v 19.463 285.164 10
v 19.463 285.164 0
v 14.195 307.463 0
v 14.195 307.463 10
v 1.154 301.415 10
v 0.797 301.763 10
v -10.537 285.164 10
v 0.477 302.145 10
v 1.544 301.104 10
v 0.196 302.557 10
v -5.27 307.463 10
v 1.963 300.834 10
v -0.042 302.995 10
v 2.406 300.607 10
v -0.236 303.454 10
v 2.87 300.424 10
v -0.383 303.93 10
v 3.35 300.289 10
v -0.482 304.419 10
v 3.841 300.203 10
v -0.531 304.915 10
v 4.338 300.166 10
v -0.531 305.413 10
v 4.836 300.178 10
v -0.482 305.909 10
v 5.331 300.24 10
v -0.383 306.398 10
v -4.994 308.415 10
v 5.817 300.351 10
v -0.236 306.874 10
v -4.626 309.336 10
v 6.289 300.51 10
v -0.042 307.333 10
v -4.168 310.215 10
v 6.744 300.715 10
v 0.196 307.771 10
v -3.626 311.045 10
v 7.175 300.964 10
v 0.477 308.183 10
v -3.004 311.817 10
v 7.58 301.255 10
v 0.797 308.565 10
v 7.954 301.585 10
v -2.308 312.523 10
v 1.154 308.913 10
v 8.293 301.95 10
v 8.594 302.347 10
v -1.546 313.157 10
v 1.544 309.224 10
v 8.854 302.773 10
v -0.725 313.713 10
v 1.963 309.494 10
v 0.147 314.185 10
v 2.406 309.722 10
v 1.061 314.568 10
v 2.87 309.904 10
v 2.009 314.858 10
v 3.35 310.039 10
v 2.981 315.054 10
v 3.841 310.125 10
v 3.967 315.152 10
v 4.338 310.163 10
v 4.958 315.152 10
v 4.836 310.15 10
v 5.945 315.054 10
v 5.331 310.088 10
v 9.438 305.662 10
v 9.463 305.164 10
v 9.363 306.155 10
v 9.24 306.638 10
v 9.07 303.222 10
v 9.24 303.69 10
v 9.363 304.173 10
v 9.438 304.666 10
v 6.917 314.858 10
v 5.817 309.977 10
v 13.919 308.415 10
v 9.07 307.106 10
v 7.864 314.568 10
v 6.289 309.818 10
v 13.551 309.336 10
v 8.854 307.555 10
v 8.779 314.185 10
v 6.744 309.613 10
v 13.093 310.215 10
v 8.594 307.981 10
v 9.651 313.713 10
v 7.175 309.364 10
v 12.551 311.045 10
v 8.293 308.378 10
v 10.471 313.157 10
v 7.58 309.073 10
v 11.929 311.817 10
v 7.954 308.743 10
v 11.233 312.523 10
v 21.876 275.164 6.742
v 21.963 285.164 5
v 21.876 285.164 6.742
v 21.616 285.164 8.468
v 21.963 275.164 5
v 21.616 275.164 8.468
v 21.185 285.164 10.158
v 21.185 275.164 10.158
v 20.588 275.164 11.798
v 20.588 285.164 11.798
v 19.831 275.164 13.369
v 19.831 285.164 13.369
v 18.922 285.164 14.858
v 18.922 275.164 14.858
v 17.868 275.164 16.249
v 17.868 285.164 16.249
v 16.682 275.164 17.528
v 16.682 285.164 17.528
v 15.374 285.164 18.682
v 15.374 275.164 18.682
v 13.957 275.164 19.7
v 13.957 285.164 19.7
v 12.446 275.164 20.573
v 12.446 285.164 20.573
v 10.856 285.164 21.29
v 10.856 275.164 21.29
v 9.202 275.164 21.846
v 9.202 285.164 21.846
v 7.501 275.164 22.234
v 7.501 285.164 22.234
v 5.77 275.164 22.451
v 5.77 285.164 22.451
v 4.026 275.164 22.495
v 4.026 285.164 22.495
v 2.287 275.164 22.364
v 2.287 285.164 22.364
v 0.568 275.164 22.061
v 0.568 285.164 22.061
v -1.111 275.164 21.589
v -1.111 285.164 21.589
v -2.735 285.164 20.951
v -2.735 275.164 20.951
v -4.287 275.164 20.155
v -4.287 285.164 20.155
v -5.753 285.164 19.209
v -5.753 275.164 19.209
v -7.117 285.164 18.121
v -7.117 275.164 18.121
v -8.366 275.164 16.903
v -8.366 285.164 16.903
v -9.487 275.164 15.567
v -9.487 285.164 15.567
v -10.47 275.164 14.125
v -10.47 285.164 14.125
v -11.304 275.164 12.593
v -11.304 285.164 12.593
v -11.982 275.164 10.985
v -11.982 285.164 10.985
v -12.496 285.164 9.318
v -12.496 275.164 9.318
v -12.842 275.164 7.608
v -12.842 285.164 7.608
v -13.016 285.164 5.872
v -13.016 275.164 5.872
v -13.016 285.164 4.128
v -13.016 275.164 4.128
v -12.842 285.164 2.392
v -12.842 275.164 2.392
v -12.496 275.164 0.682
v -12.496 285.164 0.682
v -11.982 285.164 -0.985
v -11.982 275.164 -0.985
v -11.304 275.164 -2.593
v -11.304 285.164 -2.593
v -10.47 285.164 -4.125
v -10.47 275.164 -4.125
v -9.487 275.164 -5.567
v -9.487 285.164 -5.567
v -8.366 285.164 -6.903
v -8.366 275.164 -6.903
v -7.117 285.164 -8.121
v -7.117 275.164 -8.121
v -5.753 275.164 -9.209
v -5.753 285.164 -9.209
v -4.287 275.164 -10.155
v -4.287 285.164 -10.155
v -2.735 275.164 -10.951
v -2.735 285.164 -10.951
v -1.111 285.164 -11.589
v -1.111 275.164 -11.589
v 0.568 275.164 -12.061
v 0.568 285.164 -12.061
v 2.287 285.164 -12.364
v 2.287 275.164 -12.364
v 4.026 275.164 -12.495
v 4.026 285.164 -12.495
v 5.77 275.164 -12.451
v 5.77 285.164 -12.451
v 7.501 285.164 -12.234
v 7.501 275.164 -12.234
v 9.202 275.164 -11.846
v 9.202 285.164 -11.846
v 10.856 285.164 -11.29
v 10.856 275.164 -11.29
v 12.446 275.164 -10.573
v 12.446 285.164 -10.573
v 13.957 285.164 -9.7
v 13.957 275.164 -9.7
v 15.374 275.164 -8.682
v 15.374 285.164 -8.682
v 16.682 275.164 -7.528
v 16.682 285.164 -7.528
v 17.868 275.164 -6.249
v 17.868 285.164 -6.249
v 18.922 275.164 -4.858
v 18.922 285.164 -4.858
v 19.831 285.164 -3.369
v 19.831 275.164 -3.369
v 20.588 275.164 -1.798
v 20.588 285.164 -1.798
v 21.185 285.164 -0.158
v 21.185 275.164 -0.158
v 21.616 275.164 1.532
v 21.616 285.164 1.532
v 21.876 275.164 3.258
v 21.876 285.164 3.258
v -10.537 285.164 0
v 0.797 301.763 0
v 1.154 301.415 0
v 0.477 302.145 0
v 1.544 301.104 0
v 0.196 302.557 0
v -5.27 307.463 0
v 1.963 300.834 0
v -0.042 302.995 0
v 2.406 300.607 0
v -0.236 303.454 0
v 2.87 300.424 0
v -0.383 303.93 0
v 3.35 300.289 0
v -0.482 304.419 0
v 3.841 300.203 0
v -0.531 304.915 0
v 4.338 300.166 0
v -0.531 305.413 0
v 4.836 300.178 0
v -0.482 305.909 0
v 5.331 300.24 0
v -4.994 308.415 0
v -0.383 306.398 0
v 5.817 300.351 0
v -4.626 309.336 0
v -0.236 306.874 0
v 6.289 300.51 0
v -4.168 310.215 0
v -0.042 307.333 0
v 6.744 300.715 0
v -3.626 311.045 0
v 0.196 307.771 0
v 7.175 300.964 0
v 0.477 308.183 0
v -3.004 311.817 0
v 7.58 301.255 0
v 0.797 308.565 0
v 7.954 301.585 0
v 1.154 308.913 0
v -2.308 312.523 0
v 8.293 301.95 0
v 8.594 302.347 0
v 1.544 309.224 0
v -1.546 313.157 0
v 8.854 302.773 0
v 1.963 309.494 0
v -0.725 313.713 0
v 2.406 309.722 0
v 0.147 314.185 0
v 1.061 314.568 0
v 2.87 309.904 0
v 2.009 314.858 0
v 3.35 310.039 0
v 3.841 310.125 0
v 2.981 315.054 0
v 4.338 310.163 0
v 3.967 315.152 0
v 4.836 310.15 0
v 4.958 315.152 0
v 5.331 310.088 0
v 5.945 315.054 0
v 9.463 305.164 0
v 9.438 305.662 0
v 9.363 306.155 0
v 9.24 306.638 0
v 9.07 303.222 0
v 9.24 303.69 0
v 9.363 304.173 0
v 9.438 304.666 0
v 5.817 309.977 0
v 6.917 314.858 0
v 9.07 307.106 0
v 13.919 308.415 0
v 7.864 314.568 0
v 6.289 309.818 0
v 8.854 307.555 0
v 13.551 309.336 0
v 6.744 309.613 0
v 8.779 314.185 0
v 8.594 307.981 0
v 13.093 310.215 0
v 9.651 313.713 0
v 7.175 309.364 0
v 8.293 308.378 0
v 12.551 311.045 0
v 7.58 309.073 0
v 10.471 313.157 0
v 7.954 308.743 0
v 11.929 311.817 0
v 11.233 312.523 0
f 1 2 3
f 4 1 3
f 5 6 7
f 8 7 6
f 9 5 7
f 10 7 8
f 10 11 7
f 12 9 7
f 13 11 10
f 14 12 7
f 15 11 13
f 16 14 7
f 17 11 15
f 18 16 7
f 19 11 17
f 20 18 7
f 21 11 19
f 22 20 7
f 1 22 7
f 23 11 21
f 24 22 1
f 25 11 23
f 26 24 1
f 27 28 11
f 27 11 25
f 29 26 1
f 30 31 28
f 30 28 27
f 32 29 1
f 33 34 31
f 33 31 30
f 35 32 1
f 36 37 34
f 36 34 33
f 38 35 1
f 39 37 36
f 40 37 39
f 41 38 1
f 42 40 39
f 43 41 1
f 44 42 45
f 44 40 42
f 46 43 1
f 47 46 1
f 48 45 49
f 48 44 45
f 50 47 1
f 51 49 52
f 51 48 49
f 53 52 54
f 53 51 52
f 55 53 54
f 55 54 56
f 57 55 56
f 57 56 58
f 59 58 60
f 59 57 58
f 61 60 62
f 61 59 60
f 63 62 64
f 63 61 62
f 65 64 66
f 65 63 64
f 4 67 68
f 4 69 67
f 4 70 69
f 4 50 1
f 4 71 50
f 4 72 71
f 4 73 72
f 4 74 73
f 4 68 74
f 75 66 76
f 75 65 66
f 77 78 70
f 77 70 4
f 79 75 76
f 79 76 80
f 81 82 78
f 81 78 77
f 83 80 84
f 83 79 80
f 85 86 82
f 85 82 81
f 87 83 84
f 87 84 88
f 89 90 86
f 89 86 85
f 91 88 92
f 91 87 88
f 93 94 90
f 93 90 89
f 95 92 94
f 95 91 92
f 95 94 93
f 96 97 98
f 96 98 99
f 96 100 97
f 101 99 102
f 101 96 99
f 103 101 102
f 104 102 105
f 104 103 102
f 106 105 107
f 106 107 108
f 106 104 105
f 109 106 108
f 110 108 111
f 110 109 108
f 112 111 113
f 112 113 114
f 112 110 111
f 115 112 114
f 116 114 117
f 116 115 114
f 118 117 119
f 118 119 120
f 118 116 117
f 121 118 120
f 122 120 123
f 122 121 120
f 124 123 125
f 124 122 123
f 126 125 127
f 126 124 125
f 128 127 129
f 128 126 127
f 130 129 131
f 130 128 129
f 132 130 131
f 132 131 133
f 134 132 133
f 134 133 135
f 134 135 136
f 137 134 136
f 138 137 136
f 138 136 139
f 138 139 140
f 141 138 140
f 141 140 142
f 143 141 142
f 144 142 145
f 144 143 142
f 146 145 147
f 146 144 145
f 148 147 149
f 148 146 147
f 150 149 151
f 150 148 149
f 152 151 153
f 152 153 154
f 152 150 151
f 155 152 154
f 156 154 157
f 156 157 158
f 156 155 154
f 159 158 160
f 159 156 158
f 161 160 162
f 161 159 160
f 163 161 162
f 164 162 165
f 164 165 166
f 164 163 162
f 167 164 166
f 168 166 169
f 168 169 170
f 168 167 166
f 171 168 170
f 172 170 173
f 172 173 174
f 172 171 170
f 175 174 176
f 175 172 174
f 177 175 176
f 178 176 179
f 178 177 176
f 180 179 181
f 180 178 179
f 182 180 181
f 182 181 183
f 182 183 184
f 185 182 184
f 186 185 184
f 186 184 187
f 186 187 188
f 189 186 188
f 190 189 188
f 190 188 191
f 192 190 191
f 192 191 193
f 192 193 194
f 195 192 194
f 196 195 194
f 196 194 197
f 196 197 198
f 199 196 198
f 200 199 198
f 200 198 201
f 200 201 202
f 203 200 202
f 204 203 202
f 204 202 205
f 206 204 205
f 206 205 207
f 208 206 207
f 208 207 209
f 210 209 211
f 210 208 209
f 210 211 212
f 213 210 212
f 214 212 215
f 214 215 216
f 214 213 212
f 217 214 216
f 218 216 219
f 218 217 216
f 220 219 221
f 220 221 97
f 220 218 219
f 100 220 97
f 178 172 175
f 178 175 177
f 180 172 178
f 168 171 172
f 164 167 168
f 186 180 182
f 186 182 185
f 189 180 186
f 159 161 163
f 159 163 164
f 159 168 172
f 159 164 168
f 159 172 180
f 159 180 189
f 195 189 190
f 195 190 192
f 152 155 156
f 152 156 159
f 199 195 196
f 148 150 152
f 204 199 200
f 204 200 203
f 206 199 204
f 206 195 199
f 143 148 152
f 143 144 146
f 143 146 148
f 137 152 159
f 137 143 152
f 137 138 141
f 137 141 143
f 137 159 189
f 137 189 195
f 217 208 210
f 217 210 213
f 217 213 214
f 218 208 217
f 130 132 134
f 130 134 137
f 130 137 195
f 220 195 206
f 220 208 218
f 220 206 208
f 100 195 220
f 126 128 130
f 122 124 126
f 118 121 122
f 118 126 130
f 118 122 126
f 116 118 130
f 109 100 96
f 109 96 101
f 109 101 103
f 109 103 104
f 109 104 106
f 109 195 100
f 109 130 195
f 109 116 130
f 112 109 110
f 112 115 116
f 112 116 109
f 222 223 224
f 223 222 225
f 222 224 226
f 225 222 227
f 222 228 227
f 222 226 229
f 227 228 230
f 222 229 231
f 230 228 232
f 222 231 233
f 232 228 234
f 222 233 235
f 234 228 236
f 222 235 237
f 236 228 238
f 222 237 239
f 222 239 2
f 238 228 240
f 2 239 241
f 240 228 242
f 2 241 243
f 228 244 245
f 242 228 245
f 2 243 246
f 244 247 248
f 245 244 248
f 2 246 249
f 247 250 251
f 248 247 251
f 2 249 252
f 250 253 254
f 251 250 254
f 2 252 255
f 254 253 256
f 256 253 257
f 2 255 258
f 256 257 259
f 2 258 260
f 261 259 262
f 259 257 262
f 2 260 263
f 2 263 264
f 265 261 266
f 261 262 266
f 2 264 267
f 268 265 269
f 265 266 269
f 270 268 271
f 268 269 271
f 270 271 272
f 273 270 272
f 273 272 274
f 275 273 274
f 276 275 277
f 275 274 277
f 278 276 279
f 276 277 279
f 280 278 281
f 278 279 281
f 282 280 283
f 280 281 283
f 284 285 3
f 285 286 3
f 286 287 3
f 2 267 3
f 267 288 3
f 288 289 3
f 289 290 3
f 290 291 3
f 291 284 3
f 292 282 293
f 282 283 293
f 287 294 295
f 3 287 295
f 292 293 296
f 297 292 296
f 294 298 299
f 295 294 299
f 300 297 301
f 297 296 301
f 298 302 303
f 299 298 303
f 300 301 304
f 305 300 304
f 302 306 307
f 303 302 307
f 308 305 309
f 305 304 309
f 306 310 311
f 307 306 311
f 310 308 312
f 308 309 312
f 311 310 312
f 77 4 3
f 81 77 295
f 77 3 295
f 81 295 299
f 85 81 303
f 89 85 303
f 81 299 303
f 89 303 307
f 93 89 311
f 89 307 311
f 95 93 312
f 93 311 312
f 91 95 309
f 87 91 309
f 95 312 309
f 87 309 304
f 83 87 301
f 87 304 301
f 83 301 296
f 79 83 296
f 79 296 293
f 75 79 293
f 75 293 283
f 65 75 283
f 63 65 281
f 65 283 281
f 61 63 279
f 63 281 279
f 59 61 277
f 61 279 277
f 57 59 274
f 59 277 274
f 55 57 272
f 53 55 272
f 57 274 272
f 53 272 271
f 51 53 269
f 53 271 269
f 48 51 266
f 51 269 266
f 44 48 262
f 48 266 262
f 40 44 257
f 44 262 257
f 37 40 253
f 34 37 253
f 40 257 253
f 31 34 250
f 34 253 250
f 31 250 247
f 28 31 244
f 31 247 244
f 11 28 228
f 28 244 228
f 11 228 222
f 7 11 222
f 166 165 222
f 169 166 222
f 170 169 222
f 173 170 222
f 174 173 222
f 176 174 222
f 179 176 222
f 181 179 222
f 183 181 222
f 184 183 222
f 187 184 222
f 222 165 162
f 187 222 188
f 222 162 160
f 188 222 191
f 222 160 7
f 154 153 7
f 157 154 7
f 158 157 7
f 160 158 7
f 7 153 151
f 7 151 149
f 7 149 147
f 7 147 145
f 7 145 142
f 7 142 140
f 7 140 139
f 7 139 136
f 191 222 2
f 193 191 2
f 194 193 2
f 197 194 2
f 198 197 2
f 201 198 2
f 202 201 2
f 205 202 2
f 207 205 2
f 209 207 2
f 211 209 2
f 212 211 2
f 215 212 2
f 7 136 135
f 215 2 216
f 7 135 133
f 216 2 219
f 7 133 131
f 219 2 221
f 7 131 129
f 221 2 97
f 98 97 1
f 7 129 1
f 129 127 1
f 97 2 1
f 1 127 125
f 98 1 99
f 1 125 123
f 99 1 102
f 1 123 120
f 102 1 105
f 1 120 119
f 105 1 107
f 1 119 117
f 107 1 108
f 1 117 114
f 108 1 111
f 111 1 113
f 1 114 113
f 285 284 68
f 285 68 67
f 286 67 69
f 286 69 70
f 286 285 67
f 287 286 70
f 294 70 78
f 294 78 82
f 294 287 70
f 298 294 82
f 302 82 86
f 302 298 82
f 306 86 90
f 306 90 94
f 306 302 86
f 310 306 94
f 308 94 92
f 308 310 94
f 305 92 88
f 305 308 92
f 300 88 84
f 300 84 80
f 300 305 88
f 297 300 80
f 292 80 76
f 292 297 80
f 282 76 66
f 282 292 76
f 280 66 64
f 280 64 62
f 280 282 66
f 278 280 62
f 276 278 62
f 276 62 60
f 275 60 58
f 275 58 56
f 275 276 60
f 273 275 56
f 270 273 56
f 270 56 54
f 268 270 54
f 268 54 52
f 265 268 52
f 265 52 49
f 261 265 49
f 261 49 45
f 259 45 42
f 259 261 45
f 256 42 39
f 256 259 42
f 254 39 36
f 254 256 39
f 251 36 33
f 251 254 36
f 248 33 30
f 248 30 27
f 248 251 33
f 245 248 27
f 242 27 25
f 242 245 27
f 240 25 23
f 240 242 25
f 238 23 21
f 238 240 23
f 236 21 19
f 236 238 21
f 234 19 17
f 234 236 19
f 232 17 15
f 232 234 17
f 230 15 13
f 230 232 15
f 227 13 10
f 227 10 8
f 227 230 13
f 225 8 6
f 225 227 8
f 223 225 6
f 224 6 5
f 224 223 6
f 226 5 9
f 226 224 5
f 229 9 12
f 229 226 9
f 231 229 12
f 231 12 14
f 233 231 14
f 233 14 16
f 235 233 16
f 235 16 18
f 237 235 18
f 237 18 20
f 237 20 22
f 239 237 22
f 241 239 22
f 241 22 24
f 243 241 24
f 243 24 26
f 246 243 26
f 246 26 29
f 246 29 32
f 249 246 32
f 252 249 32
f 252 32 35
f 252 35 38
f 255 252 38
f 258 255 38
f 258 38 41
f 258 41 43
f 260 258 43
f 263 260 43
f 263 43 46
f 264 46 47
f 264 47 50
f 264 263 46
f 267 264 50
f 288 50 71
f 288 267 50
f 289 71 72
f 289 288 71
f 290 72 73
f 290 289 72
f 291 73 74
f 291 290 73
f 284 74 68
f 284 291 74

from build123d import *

# Parameters (mm, degrees)
SKETCH_1_R           = 5
EXTRUDE_1_DEPTH      = 10
EXTRUDE_2_DEPTH      = 5
EXTRUDE_2_DEPTH_BACK = 5
SKETCH_2_R           = 17.5


with BuildPart() as part:
    # 草图1 → 凸台-拉伸1 (new body)
    with BuildSketch(Plane.XY):
        with BuildLine():
            Line((-5.269515354, 307.463167958), (-10.537394242, 285.164077124))
            Line((-10.537394242, 285.164077124), (-10.537394242, 280.164077124))
            Line((-10.537394242, 280.164077124), (19.462605758, 280.164077124))
            Line((19.462605758, 280.164077124), (19.462605758, 285.164077124))
            Line((19.462605758, 285.164077124), (14.19472687, 307.463167958))
            ThreePointArc((14.19472687, 307.463167958), (4.462605758, 315.164077124), (-5.269515354, 307.463167958))
        make_face()
        with Locations((4.462605758, 305.164077124)):
            Circle(SKETCH_1_R, mode=Mode.SUBTRACT)
    extrude(amount=EXTRUDE_1_DEPTH)

    # 草图2 → 凸台-拉伸2 (add, two sides: drawn at the far end of the back side and taken through both)
    with BuildSketch(Plane.XZ.offset(-280.164077124).offset(-EXTRUDE_2_DEPTH_BACK)):
        with Locations((4.462605758, 5)):
            Circle(SKETCH_2_R)
    extrude(amount=EXTRUDE_2_DEPTH + EXTRUDE_2_DEPTH_BACK)


solid = part.part
